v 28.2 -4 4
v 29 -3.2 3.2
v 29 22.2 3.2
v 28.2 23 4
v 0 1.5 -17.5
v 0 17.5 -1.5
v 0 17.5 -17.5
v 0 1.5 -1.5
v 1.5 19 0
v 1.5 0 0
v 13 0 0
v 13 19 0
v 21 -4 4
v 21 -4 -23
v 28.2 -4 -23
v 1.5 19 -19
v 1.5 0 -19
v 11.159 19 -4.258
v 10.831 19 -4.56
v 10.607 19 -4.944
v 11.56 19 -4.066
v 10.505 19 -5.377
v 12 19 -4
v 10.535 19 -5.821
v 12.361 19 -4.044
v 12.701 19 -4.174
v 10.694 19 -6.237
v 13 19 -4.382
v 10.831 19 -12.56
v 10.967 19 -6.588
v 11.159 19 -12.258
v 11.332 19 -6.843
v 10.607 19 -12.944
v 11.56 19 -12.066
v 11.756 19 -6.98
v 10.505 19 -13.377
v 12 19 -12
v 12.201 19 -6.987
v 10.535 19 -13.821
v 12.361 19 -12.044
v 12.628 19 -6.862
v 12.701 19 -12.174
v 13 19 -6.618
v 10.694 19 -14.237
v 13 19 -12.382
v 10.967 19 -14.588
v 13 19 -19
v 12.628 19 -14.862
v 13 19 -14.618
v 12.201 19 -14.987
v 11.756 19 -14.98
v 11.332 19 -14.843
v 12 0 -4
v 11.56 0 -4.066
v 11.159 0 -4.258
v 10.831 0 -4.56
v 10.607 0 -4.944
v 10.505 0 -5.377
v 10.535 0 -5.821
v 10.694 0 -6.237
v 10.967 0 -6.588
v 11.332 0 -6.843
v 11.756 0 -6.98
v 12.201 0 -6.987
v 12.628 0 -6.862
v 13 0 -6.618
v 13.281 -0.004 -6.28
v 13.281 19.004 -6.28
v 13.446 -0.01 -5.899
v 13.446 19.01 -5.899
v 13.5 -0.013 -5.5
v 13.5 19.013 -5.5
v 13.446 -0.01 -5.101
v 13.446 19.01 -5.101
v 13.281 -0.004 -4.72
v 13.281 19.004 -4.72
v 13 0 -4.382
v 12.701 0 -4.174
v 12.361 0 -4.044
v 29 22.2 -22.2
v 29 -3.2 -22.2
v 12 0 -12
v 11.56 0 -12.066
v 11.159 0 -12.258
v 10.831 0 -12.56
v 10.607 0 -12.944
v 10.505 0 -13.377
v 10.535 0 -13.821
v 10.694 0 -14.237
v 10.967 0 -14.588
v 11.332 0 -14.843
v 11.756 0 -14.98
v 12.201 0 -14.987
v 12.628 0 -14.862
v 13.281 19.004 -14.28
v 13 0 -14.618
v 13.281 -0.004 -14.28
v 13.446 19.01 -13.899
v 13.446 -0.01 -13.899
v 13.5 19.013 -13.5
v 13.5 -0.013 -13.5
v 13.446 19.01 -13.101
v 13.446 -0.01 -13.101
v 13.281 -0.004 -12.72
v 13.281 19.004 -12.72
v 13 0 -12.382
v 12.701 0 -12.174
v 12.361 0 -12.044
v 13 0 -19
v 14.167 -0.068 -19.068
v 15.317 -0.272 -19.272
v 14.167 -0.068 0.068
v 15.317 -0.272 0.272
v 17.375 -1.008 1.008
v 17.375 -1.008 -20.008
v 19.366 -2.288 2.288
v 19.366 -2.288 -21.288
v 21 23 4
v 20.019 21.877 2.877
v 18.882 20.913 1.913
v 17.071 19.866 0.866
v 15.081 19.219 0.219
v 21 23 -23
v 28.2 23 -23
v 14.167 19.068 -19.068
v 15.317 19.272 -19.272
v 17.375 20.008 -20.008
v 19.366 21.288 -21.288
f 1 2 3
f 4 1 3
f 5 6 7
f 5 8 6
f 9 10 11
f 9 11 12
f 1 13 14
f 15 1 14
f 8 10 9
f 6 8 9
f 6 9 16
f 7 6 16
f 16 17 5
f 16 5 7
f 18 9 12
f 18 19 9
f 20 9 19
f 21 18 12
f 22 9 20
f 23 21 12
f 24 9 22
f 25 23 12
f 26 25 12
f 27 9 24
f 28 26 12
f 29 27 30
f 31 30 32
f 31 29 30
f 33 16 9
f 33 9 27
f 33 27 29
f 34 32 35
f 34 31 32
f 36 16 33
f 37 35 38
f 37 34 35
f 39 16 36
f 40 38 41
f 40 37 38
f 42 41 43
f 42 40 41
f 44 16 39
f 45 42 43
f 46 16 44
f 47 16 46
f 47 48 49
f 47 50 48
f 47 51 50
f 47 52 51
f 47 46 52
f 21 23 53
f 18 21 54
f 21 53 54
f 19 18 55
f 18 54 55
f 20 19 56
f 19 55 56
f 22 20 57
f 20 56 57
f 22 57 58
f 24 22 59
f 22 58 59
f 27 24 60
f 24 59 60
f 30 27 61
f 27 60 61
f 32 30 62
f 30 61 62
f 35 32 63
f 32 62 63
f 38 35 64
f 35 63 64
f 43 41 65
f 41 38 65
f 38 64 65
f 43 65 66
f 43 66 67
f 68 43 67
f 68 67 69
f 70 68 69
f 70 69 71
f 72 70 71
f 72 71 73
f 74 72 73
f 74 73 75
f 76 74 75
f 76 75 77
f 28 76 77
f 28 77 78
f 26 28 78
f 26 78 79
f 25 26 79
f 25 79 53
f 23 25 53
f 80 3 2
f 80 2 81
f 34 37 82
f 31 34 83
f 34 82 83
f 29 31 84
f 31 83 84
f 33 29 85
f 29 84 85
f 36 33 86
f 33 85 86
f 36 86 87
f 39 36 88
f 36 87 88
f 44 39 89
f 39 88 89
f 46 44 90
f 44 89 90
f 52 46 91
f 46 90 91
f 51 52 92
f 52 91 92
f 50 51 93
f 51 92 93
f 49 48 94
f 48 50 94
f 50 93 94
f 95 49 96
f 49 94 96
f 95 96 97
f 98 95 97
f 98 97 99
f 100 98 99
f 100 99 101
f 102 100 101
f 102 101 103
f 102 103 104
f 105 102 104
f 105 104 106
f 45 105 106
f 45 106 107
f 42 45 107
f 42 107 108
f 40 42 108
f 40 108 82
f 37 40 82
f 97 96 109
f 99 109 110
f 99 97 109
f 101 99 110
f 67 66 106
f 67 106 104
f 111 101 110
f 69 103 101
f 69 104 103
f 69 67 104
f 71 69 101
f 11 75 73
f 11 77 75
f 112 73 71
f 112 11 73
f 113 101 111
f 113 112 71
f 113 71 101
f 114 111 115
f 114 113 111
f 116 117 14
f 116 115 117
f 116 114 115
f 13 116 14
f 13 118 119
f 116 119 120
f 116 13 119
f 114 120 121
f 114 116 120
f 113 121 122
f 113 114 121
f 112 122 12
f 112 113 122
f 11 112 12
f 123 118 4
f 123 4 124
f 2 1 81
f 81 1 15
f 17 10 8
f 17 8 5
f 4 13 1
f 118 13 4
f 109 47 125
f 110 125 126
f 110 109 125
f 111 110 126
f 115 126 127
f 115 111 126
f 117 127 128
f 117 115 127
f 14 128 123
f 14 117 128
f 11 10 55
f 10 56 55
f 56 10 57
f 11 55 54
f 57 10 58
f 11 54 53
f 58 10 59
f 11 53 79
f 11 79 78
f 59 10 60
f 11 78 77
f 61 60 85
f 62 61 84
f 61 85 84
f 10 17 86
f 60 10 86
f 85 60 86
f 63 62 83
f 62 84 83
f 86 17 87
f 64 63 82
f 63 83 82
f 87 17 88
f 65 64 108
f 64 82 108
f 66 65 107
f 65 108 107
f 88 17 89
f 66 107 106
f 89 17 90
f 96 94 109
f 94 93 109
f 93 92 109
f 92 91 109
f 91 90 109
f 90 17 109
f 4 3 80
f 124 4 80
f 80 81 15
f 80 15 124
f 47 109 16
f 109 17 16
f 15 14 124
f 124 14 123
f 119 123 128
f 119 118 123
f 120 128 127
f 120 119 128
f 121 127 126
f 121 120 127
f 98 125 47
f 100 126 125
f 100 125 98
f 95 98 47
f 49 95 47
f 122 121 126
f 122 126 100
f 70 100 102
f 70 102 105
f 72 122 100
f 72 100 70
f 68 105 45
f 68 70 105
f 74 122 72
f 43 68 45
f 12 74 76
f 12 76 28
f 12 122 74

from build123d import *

# Parameters (mm, degrees)
SKETCH1_W           = 21
SKETCH1_H           = 19
SKETCH1_R           = 1.5
BOSS_EXTRUDE1_DEPTH = 19
CHAMFER1_SIZE       = 1.5
SKETCH2_W           = 27
SKETCH2_H           = 27
BOSS_EXTRUDE2_DEPTH = 8
FILLET1_R           = 10
CHAMFER2_SIZE       = 0.8


with BuildPart() as part:
    # Sketch1 → Boss-Extrude1 (new body)
    with BuildSketch(Plane(origin=(0, 0, 0), x_dir=(1, 0, 0), z_dir=(0, 1, 0))):
        with Locations((10.5, 9.5)):
            Rectangle(SKETCH1_W, SKETCH1_H)
        with Locations(Location((12, 13.5, 0), (0, 0, 270))):
            Circle(SKETCH1_R, mode=Mode.SUBTRACT)
        with Locations(Location((12, 5.5, 0), (0, 0, 270))):
            Circle(SKETCH1_R, mode=Mode.SUBTRACT)
    extrude(amount=BOSS_EXTRUDE1_DEPTH)

    # Chamfer1
    chamfer1_edges = [part.edges().sort_by_distance(p)[0] for p in [
        (0, 19, -9.5),
        (0, 0, -9.5),
        (0, 9.5, -19),
        (0, 9.5, 0),
    ]]
    chamfer(chamfer1_edges, length=CHAMFER1_SIZE)

    # Sketch2 → Boss-Extrude2 (add)
    with BuildSketch(Plane(origin=(21, 0, 0), x_dir=(0, 0, -1), z_dir=(1, 0, 0))):
        with Locations((9.5, 9.5)):
            Rectangle(SKETCH2_W, SKETCH2_H)
    extrude(amount=BOSS_EXTRUDE2_DEPTH)

    # Fillet1
    # the kernel refuses this fillet: 10 mm, written as the material it adds along each edge
    with BuildSketch(Plane(origin=(21, 19, 0), x_dir=(0, 1, 0), z_dir=(0, 0, -1))) as fillet1_piece_1_section:
        with BuildLine():
            CenterArc((10, -8), FILLET1_R, 126.869897646, 53.130102354)
            Line((0, -8), (-0.2, -8))
            Line((-0.2, -8), (-0.2, 0))
            Line((-0.2, 0), (0, 0.2))
            ThreePointArc((0, 0.2), (2, 0.2), (3.88, 0.16))
            Line((3.88, 0.16), (4, 0))
        make_face()
    fillet1_piece_1 = extrude(amount=19, mode=Mode.PRIVATE)
    fillet1_piece_1 = fillet1_piece_1 - Plane(origin=(12, 20.025432283, -13.5), x_dir=(0, 0, 1), z_dir=(0, -1, 0)) * Cylinder(1.5, 70, mode=Mode.PRIVATE)
    fillet1_piece_1 = fillet1_piece_1 - Plane(origin=(12, 20.025432283, -5.5), x_dir=(0, 0, 1), z_dir=(0, -1, 0)) * Cylinder(1.5, 70, mode=Mode.PRIVATE)
    add(fillet1_piece_1)
    with BuildSketch(Plane(origin=(21, 0, 0), x_dir=(0, -1, 0), z_dir=(0, 0, -1))) as fillet1_piece_2_section:
        with BuildLine():
            CenterArc((10, 8), FILLET1_R, 180, 53.130102354)
            Line((0, 8), (-0.2, 8))
            Line((-0.2, 8), (-0.2, 0))
            Line((-0.2, 0), (0, -0.2))
            ThreePointArc((0, -0.2), (2, -0.2), (3.88, -0.16))
            Line((3.88, -0.16), (4, 0))
        make_face()
    fillet1_piece_2 = extrude(amount=19, mode=Mode.PRIVATE)
    fillet1_piece_2 = fillet1_piece_2 - Plane(origin=(12, -1.025432283, -13.5), x_dir=(0, 0, 1), z_dir=(0, -1, 0)) * Cylinder(1.5, 70, mode=Mode.PRIVATE)
    fillet1_piece_2 = fillet1_piece_2 - Plane(origin=(12, -1.025432283, -5.5), x_dir=(0, 0, 1), z_dir=(0, -1, 0)) * Cylinder(1.5, 70, mode=Mode.PRIVATE)
    add(fillet1_piece_2)
    with BuildSketch(Plane(origin=(21, 0, -19), x_dir=(0, 0, -1), z_dir=(0, 1, 0))) as fillet1_piece_3:
        with BuildLine():
            CenterArc((10, 8), FILLET1_R, 180, 53.130102354)
            Line((0, 8), (-0.2, 8))
            Line((-0.2, 8), (-0.2, 0))
            Line((-0.2, 0), (0, -0.2))
            ThreePointArc((0, -0.2), (2, -0.2), (3.88, -0.16))
            Line((3.88, -0.16), (4, 0))
        make_face()
    extrude(amount=19)
    with BuildSketch(Plane(origin=(21, 0, 0), x_dir=(0, 0, 1), z_dir=(0, 1, 0))) as fillet1_piece_4:
        with BuildLine():
            CenterArc((10, -8), FILLET1_R, 126.869897646, 53.130102354)
            Line((0, -8), (-0.2, -8))
            Line((-0.2, -8), (-0.2, 0))
            Line((-0.2, 0), (0, 0.2))
            ThreePointArc((0, 0.2), (2, 0.2), (3.88, 0.16))
            Line((3.88, 0.16), (4, 0))
        make_face()
    extrude(amount=19)
    with BuildSketch(Plane(origin=(21, 19, 20), x_dir=(0, 1, 0), z_dir=(0, 0, -1))) as fillet1_piece_5a_section:
        with BuildLine():
            CenterArc((10, -8), FILLET1_R, 126.869897646, 53.130102354)
            Line((0, -8), (-0.2, -8))
            Line((-0.2, -8), (-0.2, 0))
            Line((-0.2, 0), (0, 0.2))
            ThreePointArc((0, 0.2), (2, 0.2), (3.88, 0.16))
            Line((3.88, 0.16), (4, 0))
        make_face()
    fillet1_piece_5a = extrude(amount=39, mode=Mode.PRIVATE)
    fillet1_piece_5a = split(fillet1_piece_5a, bisect_by=Plane(origin=(18.941165886, 20.023885124, 4), z_dir=(0, 0, -1)), keep=Keep.TOP, mode=Mode.PRIVATE)
    fillet1_piece_5a = split(fillet1_piece_5a, bisect_by=Plane(origin=(18.941165886, 20.023885124, 0), z_dir=(0, 0, 1)), keep=Keep.TOP, mode=Mode.PRIVATE)
    with BuildSketch(Plane(origin=(21, 0, 0), x_dir=(0, 0, 1), z_dir=(0, 1, 0))) as fillet1_piece_5b_section:
        with BuildLine():
            CenterArc((10, -8), FILLET1_R, 126.869897646, 53.130102354)
            Line((0, -8), (-0.2, -8))
            Line((-0.2, -8), (-0.2, 0))
            Line((-0.2, 0), (0, 0.2))
            ThreePointArc((0, 0.2), (2, 0.2), (3.88, 0.16))
            Line((3.88, 0.16), (4, 0))
        make_face()
    fillet1_piece_5b = extrude(amount=39, mode=Mode.PRIVATE)
    fillet1_piece_5b = split(fillet1_piece_5b, bisect_by=Plane(origin=(18.941165886, 23, 1.023885124), z_dir=(0, -1, 0)), keep=Keep.TOP, mode=Mode.PRIVATE)
    fillet1_piece_5b = split(fillet1_piece_5b, bisect_by=Plane(origin=(18.941165886, 19, 1.023885124), z_dir=(0, 1, 0)), keep=Keep.TOP, mode=Mode.PRIVATE)
    fillet1_piece_5 = fillet1_piece_5a & fillet1_piece_5b
    add(fillet1_piece_5)
    with BuildSketch(Plane(origin=(21, 0, -19), x_dir=(0, 0, -1), z_dir=(0, 1, 0))) as fillet1_piece_6a_section:
        with BuildLine():
            CenterArc((10, 8), FILLET1_R, 180, 53.130102354)
            Line((0, 8), (-0.2, 8))
            Line((-0.2, 8), (-0.2, 0))
            Line((-0.2, 0), (0, -0.2))
            ThreePointArc((0, -0.2), (2, -0.2), (3.88, -0.16))
            Line((3.88, -0.16), (4, 0))
        make_face()
    fillet1_piece_6a = extrude(amount=39, mode=Mode.PRIVATE)
    fillet1_piece_6a = split(fillet1_piece_6a, bisect_by=Plane(origin=(18.941165886, 23, -20.023885124), z_dir=(0, -1, 0)), keep=Keep.TOP, mode=Mode.PRIVATE)
    fillet1_piece_6a = split(fillet1_piece_6a, bisect_by=Plane(origin=(18.941165886, 19, -20.023885124), z_dir=(0, 1, 0)), keep=Keep.TOP, mode=Mode.PRIVATE)
    with BuildSketch(Plane(origin=(21, 19, 0), x_dir=(0, 1, 0), z_dir=(0, 0, -1))) as fillet1_piece_6b_section:
        with BuildLine():
            CenterArc((10, -8), FILLET1_R, 126.869897646, 53.130102354)
            Line((0, -8), (-0.2, -8))
            Line((-0.2, -8), (-0.2, 0))
            Line((-0.2, 0), (0, 0.2))
            ThreePointArc((0, 0.2), (2, 0.2), (3.88, 0.16))
            Line((3.88, 0.16), (4, 0))
        make_face()
    fillet1_piece_6b = extrude(amount=39, mode=Mode.PRIVATE)
    fillet1_piece_6b = split(fillet1_piece_6b, bisect_by=Plane(origin=(18.941165886, 20.023885124, -23), z_dir=(0, 0, 1)), keep=Keep.TOP, mode=Mode.PRIVATE)
    fillet1_piece_6b = split(fillet1_piece_6b, bisect_by=Plane(origin=(18.941165886, 20.023885124, -19), z_dir=(0, 0, -1)), keep=Keep.TOP, mode=Mode.PRIVATE)
    fillet1_piece_6 = fillet1_piece_6a & fillet1_piece_6b
    add(fillet1_piece_6)
    with BuildSketch(Plane(origin=(21, 0, 20), x_dir=(0, -1, 0), z_dir=(0, 0, -1))) as fillet1_piece_7a_section:
        with BuildLine():
            CenterArc((10, 8), FILLET1_R, 180, 53.130102354)
            Line((0, 8), (-0.2, 8))
            Line((-0.2, 8), (-0.2, 0))
            Line((-0.2, 0), (0, -0.2))
            ThreePointArc((0, -0.2), (2, -0.2), (3.88, -0.16))
            Line((3.88, -0.16), (4, 0))
        make_face()
    fillet1_piece_7a = extrude(amount=39, mode=Mode.PRIVATE)
    fillet1_piece_7a = split(fillet1_piece_7a, bisect_by=Plane(origin=(18.941165886, -1.023885124, 4), z_dir=(0, 0, -1)), keep=Keep.TOP, mode=Mode.PRIVATE)
    fillet1_piece_7a = split(fillet1_piece_7a, bisect_by=Plane(origin=(18.941165886, -1.023885124, 0), z_dir=(0, 0, 1)), keep=Keep.TOP, mode=Mode.PRIVATE)
    with BuildSketch(Plane(origin=(21, -20, 0), x_dir=(0, 0, 1), z_dir=(0, 1, 0))) as fillet1_piece_7b_section:
        with BuildLine():
            CenterArc((10, -8), FILLET1_R, 126.869897646, 53.130102354)
            Line((0, -8), (-0.2, -8))
            Line((-0.2, -8), (-0.2, 0))
            Line((-0.2, 0), (0, 0.2))
            ThreePointArc((0, 0.2), (2, 0.2), (3.88, 0.16))
            Line((3.88, 0.16), (4, 0))
        make_face()
    fillet1_piece_7b = extrude(amount=39, mode=Mode.PRIVATE)
    fillet1_piece_7b = split(fillet1_piece_7b, bisect_by=Plane(origin=(18.941165886, -4, 1.023885124), z_dir=(0, 1, 0)), keep=Keep.TOP, mode=Mode.PRIVATE)
    fillet1_piece_7b = split(fillet1_piece_7b, bisect_by=Plane(origin=(18.941165886, 0, 1.023885124), z_dir=(0, -1, 0)), keep=Keep.TOP, mode=Mode.PRIVATE)
    fillet1_piece_7 = fillet1_piece_7a & fillet1_piece_7b
    add(fillet1_piece_7)
    with BuildSketch(Plane(origin=(21, 0, 0), x_dir=(0, -1, 0), z_dir=(0, 0, -1))) as fillet1_piece_8a_section:
        with BuildLine():
            CenterArc((10, 8), FILLET1_R, 180, 53.130102354)
            Line((0, 8), (-0.2, 8))
            Line((-0.2, 8), (-0.2, 0))
            Line((-0.2, 0), (0, -0.2))
            ThreePointArc((0, -0.2), (2, -0.2), (3.88, -0.16))
            Line((3.88, -0.16), (4, 0))
        make_face()
    fillet1_piece_8a = extrude(amount=39, mode=Mode.PRIVATE)
    fillet1_piece_8a = split(fillet1_piece_8a, bisect_by=Plane(origin=(18.941165886, -1.023885124, -23), z_dir=(0, 0, 1)), keep=Keep.TOP, mode=Mode.PRIVATE)
    fillet1_piece_8a = split(fillet1_piece_8a, bisect_by=Plane(origin=(18.941165886, -1.023885124, -19), z_dir=(0, 0, -1)), keep=Keep.TOP, mode=Mode.PRIVATE)
    with BuildSketch(Plane(origin=(21, -20, -19), x_dir=(0, 0, -1), z_dir=(0, 1, 0))) as fillet1_piece_8b_section:
        with BuildLine():
            CenterArc((10, 8), FILLET1_R, 180, 53.130102354)
            Line((0, 8), (-0.2, 8))
            Line((-0.2, 8), (-0.2, 0))
            Line((-0.2, 0), (0, -0.2))
            ThreePointArc((0, -0.2), (2, -0.2), (3.88, -0.16))
            Line((3.88, -0.16), (4, 0))
        make_face()
    fillet1_piece_8b = extrude(amount=39, mode=Mode.PRIVATE)
    fillet1_piece_8b = split(fillet1_piece_8b, bisect_by=Plane(origin=(18.941165886, -4, -20.023885124), z_dir=(0, 1, 0)), keep=Keep.TOP, mode=Mode.PRIVATE)
    fillet1_piece_8b = split(fillet1_piece_8b, bisect_by=Plane(origin=(18.941165886, 0, -20.023885124), z_dir=(0, -1, 0)), keep=Keep.TOP, mode=Mode.PRIVATE)
    fillet1_piece_8 = fillet1_piece_8a & fillet1_piece_8b
    add(fillet1_piece_8)

    # Chamfer2
    chamfer2_edges = [part.edges().sort_by_distance(p)[0] for p in [
        (29, 9.5, 4),
        (29, -4, -9.5),
        (29, 9.5, -23),
        (29, 23, -9.5),
    ]]
    chamfer(chamfer2_edges, length=CHAMFER2_SIZE)


solid = part.part
